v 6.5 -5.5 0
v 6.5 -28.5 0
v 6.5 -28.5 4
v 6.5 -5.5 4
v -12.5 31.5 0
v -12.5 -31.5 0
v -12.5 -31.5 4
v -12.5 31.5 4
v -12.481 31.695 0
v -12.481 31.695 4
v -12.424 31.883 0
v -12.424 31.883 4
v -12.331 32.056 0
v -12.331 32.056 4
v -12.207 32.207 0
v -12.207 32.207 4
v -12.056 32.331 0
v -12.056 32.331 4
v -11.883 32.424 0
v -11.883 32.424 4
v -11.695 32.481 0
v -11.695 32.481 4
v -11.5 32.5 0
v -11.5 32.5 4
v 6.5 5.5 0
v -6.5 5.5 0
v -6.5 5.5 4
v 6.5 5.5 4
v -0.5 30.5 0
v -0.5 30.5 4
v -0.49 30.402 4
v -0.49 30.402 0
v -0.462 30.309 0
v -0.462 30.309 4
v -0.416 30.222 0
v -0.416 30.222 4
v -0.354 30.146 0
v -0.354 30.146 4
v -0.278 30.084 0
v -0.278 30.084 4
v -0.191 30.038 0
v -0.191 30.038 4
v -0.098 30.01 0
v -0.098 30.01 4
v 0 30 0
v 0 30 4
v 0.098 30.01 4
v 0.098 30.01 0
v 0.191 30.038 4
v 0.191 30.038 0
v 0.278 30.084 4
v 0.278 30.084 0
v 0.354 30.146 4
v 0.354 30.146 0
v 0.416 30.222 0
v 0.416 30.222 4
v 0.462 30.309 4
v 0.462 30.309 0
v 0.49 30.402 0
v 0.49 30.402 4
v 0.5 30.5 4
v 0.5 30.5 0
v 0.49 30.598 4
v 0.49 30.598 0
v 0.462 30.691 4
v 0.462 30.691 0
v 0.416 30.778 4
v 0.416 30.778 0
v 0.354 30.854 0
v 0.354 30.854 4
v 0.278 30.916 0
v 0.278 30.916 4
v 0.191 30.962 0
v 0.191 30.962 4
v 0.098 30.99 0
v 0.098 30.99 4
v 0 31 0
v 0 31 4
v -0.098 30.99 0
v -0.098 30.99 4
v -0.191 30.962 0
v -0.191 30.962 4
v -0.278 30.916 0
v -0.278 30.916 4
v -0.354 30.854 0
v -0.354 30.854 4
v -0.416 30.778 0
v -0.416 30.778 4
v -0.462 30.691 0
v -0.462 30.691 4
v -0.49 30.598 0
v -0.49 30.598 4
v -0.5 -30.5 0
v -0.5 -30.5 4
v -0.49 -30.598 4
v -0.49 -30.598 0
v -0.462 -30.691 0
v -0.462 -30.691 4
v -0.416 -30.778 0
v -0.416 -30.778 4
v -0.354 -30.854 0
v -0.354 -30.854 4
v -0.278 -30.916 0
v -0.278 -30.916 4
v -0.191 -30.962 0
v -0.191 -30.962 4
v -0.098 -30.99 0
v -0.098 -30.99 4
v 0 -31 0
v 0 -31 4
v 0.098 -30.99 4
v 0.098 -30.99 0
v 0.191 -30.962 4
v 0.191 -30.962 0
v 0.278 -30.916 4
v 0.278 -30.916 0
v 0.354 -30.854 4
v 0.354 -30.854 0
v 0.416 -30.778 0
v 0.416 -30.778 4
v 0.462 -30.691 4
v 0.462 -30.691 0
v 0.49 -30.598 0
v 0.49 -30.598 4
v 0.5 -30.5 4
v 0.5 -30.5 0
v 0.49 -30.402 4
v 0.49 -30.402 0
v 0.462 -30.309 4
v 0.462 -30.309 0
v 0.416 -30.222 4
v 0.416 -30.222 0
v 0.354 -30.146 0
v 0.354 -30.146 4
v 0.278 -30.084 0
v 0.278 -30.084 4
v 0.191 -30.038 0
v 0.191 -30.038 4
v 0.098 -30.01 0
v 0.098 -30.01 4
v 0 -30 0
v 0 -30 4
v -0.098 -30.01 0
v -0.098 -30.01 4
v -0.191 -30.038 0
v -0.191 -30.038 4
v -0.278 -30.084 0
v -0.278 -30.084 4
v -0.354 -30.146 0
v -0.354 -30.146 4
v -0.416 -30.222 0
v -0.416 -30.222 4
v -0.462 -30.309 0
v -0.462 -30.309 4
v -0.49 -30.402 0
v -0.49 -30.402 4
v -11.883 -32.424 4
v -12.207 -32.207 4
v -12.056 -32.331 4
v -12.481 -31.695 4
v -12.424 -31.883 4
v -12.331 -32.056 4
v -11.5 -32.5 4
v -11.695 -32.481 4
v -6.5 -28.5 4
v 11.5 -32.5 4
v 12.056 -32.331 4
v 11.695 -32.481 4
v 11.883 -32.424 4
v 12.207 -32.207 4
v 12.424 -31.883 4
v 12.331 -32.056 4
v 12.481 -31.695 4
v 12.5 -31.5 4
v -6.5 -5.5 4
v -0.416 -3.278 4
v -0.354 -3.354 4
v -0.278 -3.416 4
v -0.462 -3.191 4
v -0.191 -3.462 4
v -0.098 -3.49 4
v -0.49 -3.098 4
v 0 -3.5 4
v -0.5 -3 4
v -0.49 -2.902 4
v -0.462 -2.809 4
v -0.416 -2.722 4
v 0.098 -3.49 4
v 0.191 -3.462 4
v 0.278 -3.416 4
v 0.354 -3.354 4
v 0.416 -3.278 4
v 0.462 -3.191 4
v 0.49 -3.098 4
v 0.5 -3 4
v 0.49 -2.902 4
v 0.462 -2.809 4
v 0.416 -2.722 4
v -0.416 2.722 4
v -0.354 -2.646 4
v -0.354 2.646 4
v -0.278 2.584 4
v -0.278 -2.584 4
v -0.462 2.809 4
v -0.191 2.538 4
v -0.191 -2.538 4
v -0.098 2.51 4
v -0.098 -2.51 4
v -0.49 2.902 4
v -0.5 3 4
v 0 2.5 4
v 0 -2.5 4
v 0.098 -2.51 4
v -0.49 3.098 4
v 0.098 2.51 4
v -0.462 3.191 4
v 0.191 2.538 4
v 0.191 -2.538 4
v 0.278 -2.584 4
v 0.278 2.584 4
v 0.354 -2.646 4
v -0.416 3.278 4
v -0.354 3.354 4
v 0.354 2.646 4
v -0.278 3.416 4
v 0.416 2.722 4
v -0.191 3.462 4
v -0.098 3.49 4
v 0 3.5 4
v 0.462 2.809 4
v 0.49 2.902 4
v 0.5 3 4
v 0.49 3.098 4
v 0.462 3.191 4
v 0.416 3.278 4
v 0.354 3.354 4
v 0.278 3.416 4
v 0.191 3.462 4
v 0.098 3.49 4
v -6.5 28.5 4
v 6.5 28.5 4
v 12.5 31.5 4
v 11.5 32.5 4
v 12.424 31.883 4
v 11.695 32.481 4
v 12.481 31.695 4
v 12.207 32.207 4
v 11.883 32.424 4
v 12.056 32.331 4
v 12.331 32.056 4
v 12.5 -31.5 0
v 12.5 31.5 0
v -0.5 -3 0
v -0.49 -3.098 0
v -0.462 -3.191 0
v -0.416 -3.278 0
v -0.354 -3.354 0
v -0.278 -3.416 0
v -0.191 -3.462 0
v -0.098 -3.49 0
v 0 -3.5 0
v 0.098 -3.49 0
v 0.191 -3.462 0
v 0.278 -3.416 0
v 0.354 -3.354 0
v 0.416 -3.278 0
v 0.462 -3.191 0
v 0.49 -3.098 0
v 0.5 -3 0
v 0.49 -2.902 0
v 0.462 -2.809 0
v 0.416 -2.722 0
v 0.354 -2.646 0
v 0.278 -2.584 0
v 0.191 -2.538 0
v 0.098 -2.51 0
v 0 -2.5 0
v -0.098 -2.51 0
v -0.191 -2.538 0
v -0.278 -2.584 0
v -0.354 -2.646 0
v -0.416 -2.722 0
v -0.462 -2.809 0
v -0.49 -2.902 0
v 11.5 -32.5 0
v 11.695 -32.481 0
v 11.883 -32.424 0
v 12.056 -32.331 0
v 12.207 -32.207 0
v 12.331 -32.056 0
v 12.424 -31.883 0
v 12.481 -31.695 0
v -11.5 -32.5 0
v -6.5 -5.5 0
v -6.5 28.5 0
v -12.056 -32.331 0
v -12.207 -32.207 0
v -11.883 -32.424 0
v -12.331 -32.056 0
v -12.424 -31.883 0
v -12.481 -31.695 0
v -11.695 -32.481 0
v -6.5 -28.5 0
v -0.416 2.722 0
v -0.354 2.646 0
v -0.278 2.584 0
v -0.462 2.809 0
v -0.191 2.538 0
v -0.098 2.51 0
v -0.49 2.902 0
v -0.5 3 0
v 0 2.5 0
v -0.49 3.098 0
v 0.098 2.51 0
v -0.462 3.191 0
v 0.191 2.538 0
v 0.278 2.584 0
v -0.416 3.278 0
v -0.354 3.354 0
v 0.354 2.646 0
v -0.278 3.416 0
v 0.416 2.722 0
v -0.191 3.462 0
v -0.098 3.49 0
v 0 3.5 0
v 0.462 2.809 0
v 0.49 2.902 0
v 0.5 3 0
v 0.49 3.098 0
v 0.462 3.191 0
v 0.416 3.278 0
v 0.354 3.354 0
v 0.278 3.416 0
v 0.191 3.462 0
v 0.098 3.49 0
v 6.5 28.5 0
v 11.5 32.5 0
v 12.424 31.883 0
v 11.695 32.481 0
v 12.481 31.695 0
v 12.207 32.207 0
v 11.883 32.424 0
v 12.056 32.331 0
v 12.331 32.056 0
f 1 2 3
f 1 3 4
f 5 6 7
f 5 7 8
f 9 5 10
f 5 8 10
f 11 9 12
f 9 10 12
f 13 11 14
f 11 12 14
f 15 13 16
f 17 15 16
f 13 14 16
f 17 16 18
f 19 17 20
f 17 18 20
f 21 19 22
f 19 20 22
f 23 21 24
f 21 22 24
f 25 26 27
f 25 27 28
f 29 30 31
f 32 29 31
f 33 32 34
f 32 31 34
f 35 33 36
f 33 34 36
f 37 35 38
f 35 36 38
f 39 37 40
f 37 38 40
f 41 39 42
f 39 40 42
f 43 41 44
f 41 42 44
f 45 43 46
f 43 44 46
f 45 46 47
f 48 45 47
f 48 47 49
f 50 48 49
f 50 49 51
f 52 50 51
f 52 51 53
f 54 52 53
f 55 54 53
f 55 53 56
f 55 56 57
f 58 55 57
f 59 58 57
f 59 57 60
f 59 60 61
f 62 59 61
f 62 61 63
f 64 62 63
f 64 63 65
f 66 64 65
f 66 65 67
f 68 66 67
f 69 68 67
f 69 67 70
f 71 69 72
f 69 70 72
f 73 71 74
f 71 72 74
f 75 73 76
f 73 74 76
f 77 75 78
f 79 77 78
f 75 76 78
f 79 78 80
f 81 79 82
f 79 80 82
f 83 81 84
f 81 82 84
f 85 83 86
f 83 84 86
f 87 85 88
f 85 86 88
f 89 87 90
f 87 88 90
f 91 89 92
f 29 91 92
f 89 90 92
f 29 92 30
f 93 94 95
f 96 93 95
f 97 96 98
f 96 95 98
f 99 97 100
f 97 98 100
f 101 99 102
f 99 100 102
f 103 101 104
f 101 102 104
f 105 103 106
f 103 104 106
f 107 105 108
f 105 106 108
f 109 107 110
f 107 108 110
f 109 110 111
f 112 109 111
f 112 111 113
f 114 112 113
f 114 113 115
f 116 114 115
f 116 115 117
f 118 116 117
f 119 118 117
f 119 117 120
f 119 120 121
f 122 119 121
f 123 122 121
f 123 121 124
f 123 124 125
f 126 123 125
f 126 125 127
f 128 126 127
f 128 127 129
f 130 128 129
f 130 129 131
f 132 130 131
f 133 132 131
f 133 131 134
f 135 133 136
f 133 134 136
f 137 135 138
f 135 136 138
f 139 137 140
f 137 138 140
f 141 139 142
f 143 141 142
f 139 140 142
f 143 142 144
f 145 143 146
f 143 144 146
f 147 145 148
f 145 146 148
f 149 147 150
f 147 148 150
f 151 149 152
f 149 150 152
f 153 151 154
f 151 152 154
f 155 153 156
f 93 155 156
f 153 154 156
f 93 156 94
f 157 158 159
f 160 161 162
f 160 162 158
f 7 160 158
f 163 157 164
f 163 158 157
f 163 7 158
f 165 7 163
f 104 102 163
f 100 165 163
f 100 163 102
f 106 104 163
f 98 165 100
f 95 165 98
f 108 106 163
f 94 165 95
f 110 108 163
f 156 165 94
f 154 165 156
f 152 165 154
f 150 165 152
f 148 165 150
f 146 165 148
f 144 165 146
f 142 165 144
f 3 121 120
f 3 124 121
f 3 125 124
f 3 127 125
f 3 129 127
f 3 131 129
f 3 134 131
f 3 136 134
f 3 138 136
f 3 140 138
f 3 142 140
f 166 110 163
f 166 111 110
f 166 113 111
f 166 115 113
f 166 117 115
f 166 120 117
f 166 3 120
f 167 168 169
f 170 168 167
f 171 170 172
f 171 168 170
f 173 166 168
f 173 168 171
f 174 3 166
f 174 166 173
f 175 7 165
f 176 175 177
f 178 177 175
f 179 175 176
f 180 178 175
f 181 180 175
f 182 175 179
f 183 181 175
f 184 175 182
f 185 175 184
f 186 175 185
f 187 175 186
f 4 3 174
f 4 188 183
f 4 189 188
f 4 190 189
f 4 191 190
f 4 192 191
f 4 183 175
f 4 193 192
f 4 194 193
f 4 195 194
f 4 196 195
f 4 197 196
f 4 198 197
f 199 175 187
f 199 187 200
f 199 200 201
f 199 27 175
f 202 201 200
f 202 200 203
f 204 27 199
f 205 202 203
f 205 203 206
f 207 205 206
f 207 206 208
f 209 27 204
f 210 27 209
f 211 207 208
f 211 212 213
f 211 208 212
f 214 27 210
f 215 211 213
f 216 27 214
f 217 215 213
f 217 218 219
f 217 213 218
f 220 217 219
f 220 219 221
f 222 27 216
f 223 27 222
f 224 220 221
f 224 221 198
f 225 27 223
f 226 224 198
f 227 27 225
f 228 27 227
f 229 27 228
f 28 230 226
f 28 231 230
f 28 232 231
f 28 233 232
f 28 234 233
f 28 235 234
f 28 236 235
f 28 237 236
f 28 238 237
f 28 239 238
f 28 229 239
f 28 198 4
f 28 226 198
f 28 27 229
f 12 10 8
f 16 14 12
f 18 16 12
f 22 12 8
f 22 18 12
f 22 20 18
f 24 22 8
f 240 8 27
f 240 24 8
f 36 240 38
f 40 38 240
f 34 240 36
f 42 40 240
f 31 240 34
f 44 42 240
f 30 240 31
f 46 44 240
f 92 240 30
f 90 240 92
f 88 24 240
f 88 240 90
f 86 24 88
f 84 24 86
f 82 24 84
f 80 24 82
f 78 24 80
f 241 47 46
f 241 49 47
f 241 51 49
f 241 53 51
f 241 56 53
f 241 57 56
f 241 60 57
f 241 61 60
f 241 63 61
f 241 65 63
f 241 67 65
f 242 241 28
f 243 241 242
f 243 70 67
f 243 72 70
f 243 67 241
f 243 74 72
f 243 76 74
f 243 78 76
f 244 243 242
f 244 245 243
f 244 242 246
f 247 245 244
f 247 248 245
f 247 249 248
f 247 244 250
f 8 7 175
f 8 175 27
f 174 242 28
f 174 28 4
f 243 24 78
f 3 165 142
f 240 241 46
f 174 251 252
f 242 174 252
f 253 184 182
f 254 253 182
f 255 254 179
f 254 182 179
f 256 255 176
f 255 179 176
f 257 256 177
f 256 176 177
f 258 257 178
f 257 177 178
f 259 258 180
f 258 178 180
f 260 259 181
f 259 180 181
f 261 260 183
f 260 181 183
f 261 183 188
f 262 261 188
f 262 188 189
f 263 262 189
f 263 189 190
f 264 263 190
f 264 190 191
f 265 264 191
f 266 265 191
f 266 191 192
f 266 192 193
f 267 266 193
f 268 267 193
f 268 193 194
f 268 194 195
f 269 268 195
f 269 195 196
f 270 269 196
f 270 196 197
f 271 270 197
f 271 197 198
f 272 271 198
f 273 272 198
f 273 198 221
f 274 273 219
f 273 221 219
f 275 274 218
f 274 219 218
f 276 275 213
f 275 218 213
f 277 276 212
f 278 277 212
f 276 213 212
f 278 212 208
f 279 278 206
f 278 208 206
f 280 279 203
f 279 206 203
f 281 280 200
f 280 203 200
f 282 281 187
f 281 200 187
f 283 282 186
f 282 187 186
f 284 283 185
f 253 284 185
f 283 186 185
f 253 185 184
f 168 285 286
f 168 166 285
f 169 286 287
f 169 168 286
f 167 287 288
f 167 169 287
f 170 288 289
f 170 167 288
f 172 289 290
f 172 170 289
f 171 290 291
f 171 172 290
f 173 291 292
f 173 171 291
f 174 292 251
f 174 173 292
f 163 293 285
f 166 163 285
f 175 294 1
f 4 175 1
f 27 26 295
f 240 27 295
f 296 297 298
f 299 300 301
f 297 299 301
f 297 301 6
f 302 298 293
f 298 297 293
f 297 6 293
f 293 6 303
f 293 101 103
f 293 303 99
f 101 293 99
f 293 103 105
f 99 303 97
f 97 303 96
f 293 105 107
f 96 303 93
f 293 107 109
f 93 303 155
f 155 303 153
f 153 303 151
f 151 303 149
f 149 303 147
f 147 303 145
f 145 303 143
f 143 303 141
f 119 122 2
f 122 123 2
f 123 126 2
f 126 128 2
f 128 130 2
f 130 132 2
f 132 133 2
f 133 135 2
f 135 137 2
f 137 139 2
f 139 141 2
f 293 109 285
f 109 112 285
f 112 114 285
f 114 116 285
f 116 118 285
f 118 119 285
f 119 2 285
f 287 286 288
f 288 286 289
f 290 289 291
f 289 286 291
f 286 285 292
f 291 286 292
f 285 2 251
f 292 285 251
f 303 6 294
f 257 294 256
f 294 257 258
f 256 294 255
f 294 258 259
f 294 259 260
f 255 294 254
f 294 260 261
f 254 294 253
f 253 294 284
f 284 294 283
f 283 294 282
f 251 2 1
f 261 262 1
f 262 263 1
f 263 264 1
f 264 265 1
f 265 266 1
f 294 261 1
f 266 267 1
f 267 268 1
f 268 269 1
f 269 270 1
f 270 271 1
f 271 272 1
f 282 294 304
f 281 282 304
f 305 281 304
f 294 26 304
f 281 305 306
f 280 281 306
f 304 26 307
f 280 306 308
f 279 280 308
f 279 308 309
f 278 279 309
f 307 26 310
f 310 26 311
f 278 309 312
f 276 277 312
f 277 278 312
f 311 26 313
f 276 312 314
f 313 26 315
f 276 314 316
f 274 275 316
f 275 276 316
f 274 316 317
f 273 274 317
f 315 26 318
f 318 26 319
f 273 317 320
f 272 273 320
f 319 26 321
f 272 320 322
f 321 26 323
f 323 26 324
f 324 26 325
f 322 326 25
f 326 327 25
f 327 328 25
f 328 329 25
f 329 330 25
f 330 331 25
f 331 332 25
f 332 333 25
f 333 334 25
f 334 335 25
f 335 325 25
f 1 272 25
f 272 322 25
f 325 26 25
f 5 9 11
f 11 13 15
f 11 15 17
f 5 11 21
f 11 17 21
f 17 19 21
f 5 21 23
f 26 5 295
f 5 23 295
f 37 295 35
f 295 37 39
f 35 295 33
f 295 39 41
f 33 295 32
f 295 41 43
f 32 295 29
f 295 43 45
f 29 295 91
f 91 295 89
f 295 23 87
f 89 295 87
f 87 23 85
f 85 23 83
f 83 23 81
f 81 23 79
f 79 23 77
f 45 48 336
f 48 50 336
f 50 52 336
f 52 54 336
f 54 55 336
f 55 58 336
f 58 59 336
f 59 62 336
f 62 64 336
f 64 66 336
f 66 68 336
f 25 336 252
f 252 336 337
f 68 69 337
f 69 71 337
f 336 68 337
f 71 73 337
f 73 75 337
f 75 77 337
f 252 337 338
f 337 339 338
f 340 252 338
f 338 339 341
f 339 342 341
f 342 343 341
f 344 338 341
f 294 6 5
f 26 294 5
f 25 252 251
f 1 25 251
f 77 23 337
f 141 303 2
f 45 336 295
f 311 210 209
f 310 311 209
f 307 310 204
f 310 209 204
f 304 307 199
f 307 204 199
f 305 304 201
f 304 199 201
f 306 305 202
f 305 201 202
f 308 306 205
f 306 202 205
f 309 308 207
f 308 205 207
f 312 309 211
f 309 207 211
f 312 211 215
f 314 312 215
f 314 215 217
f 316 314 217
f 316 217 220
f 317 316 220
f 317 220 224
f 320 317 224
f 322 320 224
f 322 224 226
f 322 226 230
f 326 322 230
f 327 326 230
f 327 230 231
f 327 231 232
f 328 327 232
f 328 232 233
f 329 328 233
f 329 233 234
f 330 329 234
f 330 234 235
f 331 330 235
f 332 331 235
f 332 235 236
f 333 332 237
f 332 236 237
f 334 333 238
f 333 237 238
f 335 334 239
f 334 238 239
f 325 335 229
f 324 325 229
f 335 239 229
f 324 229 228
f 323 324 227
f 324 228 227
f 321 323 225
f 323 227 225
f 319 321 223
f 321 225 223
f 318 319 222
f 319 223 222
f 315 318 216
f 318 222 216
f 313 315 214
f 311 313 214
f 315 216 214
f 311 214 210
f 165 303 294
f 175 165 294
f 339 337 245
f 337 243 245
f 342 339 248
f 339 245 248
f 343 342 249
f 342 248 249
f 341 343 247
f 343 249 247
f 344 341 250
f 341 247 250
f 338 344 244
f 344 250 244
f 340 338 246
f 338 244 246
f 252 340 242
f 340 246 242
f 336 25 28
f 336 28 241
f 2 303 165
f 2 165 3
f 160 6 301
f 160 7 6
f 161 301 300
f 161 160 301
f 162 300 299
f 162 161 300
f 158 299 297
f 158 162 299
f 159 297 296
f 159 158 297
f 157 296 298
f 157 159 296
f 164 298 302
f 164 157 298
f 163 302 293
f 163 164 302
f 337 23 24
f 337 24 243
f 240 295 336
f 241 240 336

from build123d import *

# Parameters (mm, degrees)
F0_W     = 25
F0_H     = 65
F0_W_2   = 13
F0_H_2   = 23
F1_DEPTH = 4
F4_D     = 1
F5_R     = 1


with BuildPart() as f1:
    # F0 (on Top) → F1 (new body)
    with BuildSketch(Plane.XY):
        Rectangle(F0_W, F0_H)
        with Locations((0, -17)):
            Rectangle(F0_W_2, F0_H_2, mode=Mode.SUBTRACT)
        with Locations((0, 17)):
            Rectangle(F0_W_2, F0_H_2, mode=Mode.SUBTRACT)
    extrude(amount=F1_DEPTH)

    # F4 (through all)
    with Locations(Plane(origin=(0, 0, 0), x_dir=(1, 0, 0), z_dir=(0, 0, -1))):
        with Locations((0, 30.5), (0, 3), (0, -3), (0, -30.5)):
            Hole(F4_D / 2)

    # F5
    f5_edges = [f1.edges().sort_by_distance(p)[0] for p in [
        (-12.5, 32.5, 2),
        (12.5, 32.5, 2),
        (-12.5, -32.5, 2),
        (12.5, -32.5, 2),
    ]]
    fillet(f5_edges, radius=F5_R)


solid = f1.part
